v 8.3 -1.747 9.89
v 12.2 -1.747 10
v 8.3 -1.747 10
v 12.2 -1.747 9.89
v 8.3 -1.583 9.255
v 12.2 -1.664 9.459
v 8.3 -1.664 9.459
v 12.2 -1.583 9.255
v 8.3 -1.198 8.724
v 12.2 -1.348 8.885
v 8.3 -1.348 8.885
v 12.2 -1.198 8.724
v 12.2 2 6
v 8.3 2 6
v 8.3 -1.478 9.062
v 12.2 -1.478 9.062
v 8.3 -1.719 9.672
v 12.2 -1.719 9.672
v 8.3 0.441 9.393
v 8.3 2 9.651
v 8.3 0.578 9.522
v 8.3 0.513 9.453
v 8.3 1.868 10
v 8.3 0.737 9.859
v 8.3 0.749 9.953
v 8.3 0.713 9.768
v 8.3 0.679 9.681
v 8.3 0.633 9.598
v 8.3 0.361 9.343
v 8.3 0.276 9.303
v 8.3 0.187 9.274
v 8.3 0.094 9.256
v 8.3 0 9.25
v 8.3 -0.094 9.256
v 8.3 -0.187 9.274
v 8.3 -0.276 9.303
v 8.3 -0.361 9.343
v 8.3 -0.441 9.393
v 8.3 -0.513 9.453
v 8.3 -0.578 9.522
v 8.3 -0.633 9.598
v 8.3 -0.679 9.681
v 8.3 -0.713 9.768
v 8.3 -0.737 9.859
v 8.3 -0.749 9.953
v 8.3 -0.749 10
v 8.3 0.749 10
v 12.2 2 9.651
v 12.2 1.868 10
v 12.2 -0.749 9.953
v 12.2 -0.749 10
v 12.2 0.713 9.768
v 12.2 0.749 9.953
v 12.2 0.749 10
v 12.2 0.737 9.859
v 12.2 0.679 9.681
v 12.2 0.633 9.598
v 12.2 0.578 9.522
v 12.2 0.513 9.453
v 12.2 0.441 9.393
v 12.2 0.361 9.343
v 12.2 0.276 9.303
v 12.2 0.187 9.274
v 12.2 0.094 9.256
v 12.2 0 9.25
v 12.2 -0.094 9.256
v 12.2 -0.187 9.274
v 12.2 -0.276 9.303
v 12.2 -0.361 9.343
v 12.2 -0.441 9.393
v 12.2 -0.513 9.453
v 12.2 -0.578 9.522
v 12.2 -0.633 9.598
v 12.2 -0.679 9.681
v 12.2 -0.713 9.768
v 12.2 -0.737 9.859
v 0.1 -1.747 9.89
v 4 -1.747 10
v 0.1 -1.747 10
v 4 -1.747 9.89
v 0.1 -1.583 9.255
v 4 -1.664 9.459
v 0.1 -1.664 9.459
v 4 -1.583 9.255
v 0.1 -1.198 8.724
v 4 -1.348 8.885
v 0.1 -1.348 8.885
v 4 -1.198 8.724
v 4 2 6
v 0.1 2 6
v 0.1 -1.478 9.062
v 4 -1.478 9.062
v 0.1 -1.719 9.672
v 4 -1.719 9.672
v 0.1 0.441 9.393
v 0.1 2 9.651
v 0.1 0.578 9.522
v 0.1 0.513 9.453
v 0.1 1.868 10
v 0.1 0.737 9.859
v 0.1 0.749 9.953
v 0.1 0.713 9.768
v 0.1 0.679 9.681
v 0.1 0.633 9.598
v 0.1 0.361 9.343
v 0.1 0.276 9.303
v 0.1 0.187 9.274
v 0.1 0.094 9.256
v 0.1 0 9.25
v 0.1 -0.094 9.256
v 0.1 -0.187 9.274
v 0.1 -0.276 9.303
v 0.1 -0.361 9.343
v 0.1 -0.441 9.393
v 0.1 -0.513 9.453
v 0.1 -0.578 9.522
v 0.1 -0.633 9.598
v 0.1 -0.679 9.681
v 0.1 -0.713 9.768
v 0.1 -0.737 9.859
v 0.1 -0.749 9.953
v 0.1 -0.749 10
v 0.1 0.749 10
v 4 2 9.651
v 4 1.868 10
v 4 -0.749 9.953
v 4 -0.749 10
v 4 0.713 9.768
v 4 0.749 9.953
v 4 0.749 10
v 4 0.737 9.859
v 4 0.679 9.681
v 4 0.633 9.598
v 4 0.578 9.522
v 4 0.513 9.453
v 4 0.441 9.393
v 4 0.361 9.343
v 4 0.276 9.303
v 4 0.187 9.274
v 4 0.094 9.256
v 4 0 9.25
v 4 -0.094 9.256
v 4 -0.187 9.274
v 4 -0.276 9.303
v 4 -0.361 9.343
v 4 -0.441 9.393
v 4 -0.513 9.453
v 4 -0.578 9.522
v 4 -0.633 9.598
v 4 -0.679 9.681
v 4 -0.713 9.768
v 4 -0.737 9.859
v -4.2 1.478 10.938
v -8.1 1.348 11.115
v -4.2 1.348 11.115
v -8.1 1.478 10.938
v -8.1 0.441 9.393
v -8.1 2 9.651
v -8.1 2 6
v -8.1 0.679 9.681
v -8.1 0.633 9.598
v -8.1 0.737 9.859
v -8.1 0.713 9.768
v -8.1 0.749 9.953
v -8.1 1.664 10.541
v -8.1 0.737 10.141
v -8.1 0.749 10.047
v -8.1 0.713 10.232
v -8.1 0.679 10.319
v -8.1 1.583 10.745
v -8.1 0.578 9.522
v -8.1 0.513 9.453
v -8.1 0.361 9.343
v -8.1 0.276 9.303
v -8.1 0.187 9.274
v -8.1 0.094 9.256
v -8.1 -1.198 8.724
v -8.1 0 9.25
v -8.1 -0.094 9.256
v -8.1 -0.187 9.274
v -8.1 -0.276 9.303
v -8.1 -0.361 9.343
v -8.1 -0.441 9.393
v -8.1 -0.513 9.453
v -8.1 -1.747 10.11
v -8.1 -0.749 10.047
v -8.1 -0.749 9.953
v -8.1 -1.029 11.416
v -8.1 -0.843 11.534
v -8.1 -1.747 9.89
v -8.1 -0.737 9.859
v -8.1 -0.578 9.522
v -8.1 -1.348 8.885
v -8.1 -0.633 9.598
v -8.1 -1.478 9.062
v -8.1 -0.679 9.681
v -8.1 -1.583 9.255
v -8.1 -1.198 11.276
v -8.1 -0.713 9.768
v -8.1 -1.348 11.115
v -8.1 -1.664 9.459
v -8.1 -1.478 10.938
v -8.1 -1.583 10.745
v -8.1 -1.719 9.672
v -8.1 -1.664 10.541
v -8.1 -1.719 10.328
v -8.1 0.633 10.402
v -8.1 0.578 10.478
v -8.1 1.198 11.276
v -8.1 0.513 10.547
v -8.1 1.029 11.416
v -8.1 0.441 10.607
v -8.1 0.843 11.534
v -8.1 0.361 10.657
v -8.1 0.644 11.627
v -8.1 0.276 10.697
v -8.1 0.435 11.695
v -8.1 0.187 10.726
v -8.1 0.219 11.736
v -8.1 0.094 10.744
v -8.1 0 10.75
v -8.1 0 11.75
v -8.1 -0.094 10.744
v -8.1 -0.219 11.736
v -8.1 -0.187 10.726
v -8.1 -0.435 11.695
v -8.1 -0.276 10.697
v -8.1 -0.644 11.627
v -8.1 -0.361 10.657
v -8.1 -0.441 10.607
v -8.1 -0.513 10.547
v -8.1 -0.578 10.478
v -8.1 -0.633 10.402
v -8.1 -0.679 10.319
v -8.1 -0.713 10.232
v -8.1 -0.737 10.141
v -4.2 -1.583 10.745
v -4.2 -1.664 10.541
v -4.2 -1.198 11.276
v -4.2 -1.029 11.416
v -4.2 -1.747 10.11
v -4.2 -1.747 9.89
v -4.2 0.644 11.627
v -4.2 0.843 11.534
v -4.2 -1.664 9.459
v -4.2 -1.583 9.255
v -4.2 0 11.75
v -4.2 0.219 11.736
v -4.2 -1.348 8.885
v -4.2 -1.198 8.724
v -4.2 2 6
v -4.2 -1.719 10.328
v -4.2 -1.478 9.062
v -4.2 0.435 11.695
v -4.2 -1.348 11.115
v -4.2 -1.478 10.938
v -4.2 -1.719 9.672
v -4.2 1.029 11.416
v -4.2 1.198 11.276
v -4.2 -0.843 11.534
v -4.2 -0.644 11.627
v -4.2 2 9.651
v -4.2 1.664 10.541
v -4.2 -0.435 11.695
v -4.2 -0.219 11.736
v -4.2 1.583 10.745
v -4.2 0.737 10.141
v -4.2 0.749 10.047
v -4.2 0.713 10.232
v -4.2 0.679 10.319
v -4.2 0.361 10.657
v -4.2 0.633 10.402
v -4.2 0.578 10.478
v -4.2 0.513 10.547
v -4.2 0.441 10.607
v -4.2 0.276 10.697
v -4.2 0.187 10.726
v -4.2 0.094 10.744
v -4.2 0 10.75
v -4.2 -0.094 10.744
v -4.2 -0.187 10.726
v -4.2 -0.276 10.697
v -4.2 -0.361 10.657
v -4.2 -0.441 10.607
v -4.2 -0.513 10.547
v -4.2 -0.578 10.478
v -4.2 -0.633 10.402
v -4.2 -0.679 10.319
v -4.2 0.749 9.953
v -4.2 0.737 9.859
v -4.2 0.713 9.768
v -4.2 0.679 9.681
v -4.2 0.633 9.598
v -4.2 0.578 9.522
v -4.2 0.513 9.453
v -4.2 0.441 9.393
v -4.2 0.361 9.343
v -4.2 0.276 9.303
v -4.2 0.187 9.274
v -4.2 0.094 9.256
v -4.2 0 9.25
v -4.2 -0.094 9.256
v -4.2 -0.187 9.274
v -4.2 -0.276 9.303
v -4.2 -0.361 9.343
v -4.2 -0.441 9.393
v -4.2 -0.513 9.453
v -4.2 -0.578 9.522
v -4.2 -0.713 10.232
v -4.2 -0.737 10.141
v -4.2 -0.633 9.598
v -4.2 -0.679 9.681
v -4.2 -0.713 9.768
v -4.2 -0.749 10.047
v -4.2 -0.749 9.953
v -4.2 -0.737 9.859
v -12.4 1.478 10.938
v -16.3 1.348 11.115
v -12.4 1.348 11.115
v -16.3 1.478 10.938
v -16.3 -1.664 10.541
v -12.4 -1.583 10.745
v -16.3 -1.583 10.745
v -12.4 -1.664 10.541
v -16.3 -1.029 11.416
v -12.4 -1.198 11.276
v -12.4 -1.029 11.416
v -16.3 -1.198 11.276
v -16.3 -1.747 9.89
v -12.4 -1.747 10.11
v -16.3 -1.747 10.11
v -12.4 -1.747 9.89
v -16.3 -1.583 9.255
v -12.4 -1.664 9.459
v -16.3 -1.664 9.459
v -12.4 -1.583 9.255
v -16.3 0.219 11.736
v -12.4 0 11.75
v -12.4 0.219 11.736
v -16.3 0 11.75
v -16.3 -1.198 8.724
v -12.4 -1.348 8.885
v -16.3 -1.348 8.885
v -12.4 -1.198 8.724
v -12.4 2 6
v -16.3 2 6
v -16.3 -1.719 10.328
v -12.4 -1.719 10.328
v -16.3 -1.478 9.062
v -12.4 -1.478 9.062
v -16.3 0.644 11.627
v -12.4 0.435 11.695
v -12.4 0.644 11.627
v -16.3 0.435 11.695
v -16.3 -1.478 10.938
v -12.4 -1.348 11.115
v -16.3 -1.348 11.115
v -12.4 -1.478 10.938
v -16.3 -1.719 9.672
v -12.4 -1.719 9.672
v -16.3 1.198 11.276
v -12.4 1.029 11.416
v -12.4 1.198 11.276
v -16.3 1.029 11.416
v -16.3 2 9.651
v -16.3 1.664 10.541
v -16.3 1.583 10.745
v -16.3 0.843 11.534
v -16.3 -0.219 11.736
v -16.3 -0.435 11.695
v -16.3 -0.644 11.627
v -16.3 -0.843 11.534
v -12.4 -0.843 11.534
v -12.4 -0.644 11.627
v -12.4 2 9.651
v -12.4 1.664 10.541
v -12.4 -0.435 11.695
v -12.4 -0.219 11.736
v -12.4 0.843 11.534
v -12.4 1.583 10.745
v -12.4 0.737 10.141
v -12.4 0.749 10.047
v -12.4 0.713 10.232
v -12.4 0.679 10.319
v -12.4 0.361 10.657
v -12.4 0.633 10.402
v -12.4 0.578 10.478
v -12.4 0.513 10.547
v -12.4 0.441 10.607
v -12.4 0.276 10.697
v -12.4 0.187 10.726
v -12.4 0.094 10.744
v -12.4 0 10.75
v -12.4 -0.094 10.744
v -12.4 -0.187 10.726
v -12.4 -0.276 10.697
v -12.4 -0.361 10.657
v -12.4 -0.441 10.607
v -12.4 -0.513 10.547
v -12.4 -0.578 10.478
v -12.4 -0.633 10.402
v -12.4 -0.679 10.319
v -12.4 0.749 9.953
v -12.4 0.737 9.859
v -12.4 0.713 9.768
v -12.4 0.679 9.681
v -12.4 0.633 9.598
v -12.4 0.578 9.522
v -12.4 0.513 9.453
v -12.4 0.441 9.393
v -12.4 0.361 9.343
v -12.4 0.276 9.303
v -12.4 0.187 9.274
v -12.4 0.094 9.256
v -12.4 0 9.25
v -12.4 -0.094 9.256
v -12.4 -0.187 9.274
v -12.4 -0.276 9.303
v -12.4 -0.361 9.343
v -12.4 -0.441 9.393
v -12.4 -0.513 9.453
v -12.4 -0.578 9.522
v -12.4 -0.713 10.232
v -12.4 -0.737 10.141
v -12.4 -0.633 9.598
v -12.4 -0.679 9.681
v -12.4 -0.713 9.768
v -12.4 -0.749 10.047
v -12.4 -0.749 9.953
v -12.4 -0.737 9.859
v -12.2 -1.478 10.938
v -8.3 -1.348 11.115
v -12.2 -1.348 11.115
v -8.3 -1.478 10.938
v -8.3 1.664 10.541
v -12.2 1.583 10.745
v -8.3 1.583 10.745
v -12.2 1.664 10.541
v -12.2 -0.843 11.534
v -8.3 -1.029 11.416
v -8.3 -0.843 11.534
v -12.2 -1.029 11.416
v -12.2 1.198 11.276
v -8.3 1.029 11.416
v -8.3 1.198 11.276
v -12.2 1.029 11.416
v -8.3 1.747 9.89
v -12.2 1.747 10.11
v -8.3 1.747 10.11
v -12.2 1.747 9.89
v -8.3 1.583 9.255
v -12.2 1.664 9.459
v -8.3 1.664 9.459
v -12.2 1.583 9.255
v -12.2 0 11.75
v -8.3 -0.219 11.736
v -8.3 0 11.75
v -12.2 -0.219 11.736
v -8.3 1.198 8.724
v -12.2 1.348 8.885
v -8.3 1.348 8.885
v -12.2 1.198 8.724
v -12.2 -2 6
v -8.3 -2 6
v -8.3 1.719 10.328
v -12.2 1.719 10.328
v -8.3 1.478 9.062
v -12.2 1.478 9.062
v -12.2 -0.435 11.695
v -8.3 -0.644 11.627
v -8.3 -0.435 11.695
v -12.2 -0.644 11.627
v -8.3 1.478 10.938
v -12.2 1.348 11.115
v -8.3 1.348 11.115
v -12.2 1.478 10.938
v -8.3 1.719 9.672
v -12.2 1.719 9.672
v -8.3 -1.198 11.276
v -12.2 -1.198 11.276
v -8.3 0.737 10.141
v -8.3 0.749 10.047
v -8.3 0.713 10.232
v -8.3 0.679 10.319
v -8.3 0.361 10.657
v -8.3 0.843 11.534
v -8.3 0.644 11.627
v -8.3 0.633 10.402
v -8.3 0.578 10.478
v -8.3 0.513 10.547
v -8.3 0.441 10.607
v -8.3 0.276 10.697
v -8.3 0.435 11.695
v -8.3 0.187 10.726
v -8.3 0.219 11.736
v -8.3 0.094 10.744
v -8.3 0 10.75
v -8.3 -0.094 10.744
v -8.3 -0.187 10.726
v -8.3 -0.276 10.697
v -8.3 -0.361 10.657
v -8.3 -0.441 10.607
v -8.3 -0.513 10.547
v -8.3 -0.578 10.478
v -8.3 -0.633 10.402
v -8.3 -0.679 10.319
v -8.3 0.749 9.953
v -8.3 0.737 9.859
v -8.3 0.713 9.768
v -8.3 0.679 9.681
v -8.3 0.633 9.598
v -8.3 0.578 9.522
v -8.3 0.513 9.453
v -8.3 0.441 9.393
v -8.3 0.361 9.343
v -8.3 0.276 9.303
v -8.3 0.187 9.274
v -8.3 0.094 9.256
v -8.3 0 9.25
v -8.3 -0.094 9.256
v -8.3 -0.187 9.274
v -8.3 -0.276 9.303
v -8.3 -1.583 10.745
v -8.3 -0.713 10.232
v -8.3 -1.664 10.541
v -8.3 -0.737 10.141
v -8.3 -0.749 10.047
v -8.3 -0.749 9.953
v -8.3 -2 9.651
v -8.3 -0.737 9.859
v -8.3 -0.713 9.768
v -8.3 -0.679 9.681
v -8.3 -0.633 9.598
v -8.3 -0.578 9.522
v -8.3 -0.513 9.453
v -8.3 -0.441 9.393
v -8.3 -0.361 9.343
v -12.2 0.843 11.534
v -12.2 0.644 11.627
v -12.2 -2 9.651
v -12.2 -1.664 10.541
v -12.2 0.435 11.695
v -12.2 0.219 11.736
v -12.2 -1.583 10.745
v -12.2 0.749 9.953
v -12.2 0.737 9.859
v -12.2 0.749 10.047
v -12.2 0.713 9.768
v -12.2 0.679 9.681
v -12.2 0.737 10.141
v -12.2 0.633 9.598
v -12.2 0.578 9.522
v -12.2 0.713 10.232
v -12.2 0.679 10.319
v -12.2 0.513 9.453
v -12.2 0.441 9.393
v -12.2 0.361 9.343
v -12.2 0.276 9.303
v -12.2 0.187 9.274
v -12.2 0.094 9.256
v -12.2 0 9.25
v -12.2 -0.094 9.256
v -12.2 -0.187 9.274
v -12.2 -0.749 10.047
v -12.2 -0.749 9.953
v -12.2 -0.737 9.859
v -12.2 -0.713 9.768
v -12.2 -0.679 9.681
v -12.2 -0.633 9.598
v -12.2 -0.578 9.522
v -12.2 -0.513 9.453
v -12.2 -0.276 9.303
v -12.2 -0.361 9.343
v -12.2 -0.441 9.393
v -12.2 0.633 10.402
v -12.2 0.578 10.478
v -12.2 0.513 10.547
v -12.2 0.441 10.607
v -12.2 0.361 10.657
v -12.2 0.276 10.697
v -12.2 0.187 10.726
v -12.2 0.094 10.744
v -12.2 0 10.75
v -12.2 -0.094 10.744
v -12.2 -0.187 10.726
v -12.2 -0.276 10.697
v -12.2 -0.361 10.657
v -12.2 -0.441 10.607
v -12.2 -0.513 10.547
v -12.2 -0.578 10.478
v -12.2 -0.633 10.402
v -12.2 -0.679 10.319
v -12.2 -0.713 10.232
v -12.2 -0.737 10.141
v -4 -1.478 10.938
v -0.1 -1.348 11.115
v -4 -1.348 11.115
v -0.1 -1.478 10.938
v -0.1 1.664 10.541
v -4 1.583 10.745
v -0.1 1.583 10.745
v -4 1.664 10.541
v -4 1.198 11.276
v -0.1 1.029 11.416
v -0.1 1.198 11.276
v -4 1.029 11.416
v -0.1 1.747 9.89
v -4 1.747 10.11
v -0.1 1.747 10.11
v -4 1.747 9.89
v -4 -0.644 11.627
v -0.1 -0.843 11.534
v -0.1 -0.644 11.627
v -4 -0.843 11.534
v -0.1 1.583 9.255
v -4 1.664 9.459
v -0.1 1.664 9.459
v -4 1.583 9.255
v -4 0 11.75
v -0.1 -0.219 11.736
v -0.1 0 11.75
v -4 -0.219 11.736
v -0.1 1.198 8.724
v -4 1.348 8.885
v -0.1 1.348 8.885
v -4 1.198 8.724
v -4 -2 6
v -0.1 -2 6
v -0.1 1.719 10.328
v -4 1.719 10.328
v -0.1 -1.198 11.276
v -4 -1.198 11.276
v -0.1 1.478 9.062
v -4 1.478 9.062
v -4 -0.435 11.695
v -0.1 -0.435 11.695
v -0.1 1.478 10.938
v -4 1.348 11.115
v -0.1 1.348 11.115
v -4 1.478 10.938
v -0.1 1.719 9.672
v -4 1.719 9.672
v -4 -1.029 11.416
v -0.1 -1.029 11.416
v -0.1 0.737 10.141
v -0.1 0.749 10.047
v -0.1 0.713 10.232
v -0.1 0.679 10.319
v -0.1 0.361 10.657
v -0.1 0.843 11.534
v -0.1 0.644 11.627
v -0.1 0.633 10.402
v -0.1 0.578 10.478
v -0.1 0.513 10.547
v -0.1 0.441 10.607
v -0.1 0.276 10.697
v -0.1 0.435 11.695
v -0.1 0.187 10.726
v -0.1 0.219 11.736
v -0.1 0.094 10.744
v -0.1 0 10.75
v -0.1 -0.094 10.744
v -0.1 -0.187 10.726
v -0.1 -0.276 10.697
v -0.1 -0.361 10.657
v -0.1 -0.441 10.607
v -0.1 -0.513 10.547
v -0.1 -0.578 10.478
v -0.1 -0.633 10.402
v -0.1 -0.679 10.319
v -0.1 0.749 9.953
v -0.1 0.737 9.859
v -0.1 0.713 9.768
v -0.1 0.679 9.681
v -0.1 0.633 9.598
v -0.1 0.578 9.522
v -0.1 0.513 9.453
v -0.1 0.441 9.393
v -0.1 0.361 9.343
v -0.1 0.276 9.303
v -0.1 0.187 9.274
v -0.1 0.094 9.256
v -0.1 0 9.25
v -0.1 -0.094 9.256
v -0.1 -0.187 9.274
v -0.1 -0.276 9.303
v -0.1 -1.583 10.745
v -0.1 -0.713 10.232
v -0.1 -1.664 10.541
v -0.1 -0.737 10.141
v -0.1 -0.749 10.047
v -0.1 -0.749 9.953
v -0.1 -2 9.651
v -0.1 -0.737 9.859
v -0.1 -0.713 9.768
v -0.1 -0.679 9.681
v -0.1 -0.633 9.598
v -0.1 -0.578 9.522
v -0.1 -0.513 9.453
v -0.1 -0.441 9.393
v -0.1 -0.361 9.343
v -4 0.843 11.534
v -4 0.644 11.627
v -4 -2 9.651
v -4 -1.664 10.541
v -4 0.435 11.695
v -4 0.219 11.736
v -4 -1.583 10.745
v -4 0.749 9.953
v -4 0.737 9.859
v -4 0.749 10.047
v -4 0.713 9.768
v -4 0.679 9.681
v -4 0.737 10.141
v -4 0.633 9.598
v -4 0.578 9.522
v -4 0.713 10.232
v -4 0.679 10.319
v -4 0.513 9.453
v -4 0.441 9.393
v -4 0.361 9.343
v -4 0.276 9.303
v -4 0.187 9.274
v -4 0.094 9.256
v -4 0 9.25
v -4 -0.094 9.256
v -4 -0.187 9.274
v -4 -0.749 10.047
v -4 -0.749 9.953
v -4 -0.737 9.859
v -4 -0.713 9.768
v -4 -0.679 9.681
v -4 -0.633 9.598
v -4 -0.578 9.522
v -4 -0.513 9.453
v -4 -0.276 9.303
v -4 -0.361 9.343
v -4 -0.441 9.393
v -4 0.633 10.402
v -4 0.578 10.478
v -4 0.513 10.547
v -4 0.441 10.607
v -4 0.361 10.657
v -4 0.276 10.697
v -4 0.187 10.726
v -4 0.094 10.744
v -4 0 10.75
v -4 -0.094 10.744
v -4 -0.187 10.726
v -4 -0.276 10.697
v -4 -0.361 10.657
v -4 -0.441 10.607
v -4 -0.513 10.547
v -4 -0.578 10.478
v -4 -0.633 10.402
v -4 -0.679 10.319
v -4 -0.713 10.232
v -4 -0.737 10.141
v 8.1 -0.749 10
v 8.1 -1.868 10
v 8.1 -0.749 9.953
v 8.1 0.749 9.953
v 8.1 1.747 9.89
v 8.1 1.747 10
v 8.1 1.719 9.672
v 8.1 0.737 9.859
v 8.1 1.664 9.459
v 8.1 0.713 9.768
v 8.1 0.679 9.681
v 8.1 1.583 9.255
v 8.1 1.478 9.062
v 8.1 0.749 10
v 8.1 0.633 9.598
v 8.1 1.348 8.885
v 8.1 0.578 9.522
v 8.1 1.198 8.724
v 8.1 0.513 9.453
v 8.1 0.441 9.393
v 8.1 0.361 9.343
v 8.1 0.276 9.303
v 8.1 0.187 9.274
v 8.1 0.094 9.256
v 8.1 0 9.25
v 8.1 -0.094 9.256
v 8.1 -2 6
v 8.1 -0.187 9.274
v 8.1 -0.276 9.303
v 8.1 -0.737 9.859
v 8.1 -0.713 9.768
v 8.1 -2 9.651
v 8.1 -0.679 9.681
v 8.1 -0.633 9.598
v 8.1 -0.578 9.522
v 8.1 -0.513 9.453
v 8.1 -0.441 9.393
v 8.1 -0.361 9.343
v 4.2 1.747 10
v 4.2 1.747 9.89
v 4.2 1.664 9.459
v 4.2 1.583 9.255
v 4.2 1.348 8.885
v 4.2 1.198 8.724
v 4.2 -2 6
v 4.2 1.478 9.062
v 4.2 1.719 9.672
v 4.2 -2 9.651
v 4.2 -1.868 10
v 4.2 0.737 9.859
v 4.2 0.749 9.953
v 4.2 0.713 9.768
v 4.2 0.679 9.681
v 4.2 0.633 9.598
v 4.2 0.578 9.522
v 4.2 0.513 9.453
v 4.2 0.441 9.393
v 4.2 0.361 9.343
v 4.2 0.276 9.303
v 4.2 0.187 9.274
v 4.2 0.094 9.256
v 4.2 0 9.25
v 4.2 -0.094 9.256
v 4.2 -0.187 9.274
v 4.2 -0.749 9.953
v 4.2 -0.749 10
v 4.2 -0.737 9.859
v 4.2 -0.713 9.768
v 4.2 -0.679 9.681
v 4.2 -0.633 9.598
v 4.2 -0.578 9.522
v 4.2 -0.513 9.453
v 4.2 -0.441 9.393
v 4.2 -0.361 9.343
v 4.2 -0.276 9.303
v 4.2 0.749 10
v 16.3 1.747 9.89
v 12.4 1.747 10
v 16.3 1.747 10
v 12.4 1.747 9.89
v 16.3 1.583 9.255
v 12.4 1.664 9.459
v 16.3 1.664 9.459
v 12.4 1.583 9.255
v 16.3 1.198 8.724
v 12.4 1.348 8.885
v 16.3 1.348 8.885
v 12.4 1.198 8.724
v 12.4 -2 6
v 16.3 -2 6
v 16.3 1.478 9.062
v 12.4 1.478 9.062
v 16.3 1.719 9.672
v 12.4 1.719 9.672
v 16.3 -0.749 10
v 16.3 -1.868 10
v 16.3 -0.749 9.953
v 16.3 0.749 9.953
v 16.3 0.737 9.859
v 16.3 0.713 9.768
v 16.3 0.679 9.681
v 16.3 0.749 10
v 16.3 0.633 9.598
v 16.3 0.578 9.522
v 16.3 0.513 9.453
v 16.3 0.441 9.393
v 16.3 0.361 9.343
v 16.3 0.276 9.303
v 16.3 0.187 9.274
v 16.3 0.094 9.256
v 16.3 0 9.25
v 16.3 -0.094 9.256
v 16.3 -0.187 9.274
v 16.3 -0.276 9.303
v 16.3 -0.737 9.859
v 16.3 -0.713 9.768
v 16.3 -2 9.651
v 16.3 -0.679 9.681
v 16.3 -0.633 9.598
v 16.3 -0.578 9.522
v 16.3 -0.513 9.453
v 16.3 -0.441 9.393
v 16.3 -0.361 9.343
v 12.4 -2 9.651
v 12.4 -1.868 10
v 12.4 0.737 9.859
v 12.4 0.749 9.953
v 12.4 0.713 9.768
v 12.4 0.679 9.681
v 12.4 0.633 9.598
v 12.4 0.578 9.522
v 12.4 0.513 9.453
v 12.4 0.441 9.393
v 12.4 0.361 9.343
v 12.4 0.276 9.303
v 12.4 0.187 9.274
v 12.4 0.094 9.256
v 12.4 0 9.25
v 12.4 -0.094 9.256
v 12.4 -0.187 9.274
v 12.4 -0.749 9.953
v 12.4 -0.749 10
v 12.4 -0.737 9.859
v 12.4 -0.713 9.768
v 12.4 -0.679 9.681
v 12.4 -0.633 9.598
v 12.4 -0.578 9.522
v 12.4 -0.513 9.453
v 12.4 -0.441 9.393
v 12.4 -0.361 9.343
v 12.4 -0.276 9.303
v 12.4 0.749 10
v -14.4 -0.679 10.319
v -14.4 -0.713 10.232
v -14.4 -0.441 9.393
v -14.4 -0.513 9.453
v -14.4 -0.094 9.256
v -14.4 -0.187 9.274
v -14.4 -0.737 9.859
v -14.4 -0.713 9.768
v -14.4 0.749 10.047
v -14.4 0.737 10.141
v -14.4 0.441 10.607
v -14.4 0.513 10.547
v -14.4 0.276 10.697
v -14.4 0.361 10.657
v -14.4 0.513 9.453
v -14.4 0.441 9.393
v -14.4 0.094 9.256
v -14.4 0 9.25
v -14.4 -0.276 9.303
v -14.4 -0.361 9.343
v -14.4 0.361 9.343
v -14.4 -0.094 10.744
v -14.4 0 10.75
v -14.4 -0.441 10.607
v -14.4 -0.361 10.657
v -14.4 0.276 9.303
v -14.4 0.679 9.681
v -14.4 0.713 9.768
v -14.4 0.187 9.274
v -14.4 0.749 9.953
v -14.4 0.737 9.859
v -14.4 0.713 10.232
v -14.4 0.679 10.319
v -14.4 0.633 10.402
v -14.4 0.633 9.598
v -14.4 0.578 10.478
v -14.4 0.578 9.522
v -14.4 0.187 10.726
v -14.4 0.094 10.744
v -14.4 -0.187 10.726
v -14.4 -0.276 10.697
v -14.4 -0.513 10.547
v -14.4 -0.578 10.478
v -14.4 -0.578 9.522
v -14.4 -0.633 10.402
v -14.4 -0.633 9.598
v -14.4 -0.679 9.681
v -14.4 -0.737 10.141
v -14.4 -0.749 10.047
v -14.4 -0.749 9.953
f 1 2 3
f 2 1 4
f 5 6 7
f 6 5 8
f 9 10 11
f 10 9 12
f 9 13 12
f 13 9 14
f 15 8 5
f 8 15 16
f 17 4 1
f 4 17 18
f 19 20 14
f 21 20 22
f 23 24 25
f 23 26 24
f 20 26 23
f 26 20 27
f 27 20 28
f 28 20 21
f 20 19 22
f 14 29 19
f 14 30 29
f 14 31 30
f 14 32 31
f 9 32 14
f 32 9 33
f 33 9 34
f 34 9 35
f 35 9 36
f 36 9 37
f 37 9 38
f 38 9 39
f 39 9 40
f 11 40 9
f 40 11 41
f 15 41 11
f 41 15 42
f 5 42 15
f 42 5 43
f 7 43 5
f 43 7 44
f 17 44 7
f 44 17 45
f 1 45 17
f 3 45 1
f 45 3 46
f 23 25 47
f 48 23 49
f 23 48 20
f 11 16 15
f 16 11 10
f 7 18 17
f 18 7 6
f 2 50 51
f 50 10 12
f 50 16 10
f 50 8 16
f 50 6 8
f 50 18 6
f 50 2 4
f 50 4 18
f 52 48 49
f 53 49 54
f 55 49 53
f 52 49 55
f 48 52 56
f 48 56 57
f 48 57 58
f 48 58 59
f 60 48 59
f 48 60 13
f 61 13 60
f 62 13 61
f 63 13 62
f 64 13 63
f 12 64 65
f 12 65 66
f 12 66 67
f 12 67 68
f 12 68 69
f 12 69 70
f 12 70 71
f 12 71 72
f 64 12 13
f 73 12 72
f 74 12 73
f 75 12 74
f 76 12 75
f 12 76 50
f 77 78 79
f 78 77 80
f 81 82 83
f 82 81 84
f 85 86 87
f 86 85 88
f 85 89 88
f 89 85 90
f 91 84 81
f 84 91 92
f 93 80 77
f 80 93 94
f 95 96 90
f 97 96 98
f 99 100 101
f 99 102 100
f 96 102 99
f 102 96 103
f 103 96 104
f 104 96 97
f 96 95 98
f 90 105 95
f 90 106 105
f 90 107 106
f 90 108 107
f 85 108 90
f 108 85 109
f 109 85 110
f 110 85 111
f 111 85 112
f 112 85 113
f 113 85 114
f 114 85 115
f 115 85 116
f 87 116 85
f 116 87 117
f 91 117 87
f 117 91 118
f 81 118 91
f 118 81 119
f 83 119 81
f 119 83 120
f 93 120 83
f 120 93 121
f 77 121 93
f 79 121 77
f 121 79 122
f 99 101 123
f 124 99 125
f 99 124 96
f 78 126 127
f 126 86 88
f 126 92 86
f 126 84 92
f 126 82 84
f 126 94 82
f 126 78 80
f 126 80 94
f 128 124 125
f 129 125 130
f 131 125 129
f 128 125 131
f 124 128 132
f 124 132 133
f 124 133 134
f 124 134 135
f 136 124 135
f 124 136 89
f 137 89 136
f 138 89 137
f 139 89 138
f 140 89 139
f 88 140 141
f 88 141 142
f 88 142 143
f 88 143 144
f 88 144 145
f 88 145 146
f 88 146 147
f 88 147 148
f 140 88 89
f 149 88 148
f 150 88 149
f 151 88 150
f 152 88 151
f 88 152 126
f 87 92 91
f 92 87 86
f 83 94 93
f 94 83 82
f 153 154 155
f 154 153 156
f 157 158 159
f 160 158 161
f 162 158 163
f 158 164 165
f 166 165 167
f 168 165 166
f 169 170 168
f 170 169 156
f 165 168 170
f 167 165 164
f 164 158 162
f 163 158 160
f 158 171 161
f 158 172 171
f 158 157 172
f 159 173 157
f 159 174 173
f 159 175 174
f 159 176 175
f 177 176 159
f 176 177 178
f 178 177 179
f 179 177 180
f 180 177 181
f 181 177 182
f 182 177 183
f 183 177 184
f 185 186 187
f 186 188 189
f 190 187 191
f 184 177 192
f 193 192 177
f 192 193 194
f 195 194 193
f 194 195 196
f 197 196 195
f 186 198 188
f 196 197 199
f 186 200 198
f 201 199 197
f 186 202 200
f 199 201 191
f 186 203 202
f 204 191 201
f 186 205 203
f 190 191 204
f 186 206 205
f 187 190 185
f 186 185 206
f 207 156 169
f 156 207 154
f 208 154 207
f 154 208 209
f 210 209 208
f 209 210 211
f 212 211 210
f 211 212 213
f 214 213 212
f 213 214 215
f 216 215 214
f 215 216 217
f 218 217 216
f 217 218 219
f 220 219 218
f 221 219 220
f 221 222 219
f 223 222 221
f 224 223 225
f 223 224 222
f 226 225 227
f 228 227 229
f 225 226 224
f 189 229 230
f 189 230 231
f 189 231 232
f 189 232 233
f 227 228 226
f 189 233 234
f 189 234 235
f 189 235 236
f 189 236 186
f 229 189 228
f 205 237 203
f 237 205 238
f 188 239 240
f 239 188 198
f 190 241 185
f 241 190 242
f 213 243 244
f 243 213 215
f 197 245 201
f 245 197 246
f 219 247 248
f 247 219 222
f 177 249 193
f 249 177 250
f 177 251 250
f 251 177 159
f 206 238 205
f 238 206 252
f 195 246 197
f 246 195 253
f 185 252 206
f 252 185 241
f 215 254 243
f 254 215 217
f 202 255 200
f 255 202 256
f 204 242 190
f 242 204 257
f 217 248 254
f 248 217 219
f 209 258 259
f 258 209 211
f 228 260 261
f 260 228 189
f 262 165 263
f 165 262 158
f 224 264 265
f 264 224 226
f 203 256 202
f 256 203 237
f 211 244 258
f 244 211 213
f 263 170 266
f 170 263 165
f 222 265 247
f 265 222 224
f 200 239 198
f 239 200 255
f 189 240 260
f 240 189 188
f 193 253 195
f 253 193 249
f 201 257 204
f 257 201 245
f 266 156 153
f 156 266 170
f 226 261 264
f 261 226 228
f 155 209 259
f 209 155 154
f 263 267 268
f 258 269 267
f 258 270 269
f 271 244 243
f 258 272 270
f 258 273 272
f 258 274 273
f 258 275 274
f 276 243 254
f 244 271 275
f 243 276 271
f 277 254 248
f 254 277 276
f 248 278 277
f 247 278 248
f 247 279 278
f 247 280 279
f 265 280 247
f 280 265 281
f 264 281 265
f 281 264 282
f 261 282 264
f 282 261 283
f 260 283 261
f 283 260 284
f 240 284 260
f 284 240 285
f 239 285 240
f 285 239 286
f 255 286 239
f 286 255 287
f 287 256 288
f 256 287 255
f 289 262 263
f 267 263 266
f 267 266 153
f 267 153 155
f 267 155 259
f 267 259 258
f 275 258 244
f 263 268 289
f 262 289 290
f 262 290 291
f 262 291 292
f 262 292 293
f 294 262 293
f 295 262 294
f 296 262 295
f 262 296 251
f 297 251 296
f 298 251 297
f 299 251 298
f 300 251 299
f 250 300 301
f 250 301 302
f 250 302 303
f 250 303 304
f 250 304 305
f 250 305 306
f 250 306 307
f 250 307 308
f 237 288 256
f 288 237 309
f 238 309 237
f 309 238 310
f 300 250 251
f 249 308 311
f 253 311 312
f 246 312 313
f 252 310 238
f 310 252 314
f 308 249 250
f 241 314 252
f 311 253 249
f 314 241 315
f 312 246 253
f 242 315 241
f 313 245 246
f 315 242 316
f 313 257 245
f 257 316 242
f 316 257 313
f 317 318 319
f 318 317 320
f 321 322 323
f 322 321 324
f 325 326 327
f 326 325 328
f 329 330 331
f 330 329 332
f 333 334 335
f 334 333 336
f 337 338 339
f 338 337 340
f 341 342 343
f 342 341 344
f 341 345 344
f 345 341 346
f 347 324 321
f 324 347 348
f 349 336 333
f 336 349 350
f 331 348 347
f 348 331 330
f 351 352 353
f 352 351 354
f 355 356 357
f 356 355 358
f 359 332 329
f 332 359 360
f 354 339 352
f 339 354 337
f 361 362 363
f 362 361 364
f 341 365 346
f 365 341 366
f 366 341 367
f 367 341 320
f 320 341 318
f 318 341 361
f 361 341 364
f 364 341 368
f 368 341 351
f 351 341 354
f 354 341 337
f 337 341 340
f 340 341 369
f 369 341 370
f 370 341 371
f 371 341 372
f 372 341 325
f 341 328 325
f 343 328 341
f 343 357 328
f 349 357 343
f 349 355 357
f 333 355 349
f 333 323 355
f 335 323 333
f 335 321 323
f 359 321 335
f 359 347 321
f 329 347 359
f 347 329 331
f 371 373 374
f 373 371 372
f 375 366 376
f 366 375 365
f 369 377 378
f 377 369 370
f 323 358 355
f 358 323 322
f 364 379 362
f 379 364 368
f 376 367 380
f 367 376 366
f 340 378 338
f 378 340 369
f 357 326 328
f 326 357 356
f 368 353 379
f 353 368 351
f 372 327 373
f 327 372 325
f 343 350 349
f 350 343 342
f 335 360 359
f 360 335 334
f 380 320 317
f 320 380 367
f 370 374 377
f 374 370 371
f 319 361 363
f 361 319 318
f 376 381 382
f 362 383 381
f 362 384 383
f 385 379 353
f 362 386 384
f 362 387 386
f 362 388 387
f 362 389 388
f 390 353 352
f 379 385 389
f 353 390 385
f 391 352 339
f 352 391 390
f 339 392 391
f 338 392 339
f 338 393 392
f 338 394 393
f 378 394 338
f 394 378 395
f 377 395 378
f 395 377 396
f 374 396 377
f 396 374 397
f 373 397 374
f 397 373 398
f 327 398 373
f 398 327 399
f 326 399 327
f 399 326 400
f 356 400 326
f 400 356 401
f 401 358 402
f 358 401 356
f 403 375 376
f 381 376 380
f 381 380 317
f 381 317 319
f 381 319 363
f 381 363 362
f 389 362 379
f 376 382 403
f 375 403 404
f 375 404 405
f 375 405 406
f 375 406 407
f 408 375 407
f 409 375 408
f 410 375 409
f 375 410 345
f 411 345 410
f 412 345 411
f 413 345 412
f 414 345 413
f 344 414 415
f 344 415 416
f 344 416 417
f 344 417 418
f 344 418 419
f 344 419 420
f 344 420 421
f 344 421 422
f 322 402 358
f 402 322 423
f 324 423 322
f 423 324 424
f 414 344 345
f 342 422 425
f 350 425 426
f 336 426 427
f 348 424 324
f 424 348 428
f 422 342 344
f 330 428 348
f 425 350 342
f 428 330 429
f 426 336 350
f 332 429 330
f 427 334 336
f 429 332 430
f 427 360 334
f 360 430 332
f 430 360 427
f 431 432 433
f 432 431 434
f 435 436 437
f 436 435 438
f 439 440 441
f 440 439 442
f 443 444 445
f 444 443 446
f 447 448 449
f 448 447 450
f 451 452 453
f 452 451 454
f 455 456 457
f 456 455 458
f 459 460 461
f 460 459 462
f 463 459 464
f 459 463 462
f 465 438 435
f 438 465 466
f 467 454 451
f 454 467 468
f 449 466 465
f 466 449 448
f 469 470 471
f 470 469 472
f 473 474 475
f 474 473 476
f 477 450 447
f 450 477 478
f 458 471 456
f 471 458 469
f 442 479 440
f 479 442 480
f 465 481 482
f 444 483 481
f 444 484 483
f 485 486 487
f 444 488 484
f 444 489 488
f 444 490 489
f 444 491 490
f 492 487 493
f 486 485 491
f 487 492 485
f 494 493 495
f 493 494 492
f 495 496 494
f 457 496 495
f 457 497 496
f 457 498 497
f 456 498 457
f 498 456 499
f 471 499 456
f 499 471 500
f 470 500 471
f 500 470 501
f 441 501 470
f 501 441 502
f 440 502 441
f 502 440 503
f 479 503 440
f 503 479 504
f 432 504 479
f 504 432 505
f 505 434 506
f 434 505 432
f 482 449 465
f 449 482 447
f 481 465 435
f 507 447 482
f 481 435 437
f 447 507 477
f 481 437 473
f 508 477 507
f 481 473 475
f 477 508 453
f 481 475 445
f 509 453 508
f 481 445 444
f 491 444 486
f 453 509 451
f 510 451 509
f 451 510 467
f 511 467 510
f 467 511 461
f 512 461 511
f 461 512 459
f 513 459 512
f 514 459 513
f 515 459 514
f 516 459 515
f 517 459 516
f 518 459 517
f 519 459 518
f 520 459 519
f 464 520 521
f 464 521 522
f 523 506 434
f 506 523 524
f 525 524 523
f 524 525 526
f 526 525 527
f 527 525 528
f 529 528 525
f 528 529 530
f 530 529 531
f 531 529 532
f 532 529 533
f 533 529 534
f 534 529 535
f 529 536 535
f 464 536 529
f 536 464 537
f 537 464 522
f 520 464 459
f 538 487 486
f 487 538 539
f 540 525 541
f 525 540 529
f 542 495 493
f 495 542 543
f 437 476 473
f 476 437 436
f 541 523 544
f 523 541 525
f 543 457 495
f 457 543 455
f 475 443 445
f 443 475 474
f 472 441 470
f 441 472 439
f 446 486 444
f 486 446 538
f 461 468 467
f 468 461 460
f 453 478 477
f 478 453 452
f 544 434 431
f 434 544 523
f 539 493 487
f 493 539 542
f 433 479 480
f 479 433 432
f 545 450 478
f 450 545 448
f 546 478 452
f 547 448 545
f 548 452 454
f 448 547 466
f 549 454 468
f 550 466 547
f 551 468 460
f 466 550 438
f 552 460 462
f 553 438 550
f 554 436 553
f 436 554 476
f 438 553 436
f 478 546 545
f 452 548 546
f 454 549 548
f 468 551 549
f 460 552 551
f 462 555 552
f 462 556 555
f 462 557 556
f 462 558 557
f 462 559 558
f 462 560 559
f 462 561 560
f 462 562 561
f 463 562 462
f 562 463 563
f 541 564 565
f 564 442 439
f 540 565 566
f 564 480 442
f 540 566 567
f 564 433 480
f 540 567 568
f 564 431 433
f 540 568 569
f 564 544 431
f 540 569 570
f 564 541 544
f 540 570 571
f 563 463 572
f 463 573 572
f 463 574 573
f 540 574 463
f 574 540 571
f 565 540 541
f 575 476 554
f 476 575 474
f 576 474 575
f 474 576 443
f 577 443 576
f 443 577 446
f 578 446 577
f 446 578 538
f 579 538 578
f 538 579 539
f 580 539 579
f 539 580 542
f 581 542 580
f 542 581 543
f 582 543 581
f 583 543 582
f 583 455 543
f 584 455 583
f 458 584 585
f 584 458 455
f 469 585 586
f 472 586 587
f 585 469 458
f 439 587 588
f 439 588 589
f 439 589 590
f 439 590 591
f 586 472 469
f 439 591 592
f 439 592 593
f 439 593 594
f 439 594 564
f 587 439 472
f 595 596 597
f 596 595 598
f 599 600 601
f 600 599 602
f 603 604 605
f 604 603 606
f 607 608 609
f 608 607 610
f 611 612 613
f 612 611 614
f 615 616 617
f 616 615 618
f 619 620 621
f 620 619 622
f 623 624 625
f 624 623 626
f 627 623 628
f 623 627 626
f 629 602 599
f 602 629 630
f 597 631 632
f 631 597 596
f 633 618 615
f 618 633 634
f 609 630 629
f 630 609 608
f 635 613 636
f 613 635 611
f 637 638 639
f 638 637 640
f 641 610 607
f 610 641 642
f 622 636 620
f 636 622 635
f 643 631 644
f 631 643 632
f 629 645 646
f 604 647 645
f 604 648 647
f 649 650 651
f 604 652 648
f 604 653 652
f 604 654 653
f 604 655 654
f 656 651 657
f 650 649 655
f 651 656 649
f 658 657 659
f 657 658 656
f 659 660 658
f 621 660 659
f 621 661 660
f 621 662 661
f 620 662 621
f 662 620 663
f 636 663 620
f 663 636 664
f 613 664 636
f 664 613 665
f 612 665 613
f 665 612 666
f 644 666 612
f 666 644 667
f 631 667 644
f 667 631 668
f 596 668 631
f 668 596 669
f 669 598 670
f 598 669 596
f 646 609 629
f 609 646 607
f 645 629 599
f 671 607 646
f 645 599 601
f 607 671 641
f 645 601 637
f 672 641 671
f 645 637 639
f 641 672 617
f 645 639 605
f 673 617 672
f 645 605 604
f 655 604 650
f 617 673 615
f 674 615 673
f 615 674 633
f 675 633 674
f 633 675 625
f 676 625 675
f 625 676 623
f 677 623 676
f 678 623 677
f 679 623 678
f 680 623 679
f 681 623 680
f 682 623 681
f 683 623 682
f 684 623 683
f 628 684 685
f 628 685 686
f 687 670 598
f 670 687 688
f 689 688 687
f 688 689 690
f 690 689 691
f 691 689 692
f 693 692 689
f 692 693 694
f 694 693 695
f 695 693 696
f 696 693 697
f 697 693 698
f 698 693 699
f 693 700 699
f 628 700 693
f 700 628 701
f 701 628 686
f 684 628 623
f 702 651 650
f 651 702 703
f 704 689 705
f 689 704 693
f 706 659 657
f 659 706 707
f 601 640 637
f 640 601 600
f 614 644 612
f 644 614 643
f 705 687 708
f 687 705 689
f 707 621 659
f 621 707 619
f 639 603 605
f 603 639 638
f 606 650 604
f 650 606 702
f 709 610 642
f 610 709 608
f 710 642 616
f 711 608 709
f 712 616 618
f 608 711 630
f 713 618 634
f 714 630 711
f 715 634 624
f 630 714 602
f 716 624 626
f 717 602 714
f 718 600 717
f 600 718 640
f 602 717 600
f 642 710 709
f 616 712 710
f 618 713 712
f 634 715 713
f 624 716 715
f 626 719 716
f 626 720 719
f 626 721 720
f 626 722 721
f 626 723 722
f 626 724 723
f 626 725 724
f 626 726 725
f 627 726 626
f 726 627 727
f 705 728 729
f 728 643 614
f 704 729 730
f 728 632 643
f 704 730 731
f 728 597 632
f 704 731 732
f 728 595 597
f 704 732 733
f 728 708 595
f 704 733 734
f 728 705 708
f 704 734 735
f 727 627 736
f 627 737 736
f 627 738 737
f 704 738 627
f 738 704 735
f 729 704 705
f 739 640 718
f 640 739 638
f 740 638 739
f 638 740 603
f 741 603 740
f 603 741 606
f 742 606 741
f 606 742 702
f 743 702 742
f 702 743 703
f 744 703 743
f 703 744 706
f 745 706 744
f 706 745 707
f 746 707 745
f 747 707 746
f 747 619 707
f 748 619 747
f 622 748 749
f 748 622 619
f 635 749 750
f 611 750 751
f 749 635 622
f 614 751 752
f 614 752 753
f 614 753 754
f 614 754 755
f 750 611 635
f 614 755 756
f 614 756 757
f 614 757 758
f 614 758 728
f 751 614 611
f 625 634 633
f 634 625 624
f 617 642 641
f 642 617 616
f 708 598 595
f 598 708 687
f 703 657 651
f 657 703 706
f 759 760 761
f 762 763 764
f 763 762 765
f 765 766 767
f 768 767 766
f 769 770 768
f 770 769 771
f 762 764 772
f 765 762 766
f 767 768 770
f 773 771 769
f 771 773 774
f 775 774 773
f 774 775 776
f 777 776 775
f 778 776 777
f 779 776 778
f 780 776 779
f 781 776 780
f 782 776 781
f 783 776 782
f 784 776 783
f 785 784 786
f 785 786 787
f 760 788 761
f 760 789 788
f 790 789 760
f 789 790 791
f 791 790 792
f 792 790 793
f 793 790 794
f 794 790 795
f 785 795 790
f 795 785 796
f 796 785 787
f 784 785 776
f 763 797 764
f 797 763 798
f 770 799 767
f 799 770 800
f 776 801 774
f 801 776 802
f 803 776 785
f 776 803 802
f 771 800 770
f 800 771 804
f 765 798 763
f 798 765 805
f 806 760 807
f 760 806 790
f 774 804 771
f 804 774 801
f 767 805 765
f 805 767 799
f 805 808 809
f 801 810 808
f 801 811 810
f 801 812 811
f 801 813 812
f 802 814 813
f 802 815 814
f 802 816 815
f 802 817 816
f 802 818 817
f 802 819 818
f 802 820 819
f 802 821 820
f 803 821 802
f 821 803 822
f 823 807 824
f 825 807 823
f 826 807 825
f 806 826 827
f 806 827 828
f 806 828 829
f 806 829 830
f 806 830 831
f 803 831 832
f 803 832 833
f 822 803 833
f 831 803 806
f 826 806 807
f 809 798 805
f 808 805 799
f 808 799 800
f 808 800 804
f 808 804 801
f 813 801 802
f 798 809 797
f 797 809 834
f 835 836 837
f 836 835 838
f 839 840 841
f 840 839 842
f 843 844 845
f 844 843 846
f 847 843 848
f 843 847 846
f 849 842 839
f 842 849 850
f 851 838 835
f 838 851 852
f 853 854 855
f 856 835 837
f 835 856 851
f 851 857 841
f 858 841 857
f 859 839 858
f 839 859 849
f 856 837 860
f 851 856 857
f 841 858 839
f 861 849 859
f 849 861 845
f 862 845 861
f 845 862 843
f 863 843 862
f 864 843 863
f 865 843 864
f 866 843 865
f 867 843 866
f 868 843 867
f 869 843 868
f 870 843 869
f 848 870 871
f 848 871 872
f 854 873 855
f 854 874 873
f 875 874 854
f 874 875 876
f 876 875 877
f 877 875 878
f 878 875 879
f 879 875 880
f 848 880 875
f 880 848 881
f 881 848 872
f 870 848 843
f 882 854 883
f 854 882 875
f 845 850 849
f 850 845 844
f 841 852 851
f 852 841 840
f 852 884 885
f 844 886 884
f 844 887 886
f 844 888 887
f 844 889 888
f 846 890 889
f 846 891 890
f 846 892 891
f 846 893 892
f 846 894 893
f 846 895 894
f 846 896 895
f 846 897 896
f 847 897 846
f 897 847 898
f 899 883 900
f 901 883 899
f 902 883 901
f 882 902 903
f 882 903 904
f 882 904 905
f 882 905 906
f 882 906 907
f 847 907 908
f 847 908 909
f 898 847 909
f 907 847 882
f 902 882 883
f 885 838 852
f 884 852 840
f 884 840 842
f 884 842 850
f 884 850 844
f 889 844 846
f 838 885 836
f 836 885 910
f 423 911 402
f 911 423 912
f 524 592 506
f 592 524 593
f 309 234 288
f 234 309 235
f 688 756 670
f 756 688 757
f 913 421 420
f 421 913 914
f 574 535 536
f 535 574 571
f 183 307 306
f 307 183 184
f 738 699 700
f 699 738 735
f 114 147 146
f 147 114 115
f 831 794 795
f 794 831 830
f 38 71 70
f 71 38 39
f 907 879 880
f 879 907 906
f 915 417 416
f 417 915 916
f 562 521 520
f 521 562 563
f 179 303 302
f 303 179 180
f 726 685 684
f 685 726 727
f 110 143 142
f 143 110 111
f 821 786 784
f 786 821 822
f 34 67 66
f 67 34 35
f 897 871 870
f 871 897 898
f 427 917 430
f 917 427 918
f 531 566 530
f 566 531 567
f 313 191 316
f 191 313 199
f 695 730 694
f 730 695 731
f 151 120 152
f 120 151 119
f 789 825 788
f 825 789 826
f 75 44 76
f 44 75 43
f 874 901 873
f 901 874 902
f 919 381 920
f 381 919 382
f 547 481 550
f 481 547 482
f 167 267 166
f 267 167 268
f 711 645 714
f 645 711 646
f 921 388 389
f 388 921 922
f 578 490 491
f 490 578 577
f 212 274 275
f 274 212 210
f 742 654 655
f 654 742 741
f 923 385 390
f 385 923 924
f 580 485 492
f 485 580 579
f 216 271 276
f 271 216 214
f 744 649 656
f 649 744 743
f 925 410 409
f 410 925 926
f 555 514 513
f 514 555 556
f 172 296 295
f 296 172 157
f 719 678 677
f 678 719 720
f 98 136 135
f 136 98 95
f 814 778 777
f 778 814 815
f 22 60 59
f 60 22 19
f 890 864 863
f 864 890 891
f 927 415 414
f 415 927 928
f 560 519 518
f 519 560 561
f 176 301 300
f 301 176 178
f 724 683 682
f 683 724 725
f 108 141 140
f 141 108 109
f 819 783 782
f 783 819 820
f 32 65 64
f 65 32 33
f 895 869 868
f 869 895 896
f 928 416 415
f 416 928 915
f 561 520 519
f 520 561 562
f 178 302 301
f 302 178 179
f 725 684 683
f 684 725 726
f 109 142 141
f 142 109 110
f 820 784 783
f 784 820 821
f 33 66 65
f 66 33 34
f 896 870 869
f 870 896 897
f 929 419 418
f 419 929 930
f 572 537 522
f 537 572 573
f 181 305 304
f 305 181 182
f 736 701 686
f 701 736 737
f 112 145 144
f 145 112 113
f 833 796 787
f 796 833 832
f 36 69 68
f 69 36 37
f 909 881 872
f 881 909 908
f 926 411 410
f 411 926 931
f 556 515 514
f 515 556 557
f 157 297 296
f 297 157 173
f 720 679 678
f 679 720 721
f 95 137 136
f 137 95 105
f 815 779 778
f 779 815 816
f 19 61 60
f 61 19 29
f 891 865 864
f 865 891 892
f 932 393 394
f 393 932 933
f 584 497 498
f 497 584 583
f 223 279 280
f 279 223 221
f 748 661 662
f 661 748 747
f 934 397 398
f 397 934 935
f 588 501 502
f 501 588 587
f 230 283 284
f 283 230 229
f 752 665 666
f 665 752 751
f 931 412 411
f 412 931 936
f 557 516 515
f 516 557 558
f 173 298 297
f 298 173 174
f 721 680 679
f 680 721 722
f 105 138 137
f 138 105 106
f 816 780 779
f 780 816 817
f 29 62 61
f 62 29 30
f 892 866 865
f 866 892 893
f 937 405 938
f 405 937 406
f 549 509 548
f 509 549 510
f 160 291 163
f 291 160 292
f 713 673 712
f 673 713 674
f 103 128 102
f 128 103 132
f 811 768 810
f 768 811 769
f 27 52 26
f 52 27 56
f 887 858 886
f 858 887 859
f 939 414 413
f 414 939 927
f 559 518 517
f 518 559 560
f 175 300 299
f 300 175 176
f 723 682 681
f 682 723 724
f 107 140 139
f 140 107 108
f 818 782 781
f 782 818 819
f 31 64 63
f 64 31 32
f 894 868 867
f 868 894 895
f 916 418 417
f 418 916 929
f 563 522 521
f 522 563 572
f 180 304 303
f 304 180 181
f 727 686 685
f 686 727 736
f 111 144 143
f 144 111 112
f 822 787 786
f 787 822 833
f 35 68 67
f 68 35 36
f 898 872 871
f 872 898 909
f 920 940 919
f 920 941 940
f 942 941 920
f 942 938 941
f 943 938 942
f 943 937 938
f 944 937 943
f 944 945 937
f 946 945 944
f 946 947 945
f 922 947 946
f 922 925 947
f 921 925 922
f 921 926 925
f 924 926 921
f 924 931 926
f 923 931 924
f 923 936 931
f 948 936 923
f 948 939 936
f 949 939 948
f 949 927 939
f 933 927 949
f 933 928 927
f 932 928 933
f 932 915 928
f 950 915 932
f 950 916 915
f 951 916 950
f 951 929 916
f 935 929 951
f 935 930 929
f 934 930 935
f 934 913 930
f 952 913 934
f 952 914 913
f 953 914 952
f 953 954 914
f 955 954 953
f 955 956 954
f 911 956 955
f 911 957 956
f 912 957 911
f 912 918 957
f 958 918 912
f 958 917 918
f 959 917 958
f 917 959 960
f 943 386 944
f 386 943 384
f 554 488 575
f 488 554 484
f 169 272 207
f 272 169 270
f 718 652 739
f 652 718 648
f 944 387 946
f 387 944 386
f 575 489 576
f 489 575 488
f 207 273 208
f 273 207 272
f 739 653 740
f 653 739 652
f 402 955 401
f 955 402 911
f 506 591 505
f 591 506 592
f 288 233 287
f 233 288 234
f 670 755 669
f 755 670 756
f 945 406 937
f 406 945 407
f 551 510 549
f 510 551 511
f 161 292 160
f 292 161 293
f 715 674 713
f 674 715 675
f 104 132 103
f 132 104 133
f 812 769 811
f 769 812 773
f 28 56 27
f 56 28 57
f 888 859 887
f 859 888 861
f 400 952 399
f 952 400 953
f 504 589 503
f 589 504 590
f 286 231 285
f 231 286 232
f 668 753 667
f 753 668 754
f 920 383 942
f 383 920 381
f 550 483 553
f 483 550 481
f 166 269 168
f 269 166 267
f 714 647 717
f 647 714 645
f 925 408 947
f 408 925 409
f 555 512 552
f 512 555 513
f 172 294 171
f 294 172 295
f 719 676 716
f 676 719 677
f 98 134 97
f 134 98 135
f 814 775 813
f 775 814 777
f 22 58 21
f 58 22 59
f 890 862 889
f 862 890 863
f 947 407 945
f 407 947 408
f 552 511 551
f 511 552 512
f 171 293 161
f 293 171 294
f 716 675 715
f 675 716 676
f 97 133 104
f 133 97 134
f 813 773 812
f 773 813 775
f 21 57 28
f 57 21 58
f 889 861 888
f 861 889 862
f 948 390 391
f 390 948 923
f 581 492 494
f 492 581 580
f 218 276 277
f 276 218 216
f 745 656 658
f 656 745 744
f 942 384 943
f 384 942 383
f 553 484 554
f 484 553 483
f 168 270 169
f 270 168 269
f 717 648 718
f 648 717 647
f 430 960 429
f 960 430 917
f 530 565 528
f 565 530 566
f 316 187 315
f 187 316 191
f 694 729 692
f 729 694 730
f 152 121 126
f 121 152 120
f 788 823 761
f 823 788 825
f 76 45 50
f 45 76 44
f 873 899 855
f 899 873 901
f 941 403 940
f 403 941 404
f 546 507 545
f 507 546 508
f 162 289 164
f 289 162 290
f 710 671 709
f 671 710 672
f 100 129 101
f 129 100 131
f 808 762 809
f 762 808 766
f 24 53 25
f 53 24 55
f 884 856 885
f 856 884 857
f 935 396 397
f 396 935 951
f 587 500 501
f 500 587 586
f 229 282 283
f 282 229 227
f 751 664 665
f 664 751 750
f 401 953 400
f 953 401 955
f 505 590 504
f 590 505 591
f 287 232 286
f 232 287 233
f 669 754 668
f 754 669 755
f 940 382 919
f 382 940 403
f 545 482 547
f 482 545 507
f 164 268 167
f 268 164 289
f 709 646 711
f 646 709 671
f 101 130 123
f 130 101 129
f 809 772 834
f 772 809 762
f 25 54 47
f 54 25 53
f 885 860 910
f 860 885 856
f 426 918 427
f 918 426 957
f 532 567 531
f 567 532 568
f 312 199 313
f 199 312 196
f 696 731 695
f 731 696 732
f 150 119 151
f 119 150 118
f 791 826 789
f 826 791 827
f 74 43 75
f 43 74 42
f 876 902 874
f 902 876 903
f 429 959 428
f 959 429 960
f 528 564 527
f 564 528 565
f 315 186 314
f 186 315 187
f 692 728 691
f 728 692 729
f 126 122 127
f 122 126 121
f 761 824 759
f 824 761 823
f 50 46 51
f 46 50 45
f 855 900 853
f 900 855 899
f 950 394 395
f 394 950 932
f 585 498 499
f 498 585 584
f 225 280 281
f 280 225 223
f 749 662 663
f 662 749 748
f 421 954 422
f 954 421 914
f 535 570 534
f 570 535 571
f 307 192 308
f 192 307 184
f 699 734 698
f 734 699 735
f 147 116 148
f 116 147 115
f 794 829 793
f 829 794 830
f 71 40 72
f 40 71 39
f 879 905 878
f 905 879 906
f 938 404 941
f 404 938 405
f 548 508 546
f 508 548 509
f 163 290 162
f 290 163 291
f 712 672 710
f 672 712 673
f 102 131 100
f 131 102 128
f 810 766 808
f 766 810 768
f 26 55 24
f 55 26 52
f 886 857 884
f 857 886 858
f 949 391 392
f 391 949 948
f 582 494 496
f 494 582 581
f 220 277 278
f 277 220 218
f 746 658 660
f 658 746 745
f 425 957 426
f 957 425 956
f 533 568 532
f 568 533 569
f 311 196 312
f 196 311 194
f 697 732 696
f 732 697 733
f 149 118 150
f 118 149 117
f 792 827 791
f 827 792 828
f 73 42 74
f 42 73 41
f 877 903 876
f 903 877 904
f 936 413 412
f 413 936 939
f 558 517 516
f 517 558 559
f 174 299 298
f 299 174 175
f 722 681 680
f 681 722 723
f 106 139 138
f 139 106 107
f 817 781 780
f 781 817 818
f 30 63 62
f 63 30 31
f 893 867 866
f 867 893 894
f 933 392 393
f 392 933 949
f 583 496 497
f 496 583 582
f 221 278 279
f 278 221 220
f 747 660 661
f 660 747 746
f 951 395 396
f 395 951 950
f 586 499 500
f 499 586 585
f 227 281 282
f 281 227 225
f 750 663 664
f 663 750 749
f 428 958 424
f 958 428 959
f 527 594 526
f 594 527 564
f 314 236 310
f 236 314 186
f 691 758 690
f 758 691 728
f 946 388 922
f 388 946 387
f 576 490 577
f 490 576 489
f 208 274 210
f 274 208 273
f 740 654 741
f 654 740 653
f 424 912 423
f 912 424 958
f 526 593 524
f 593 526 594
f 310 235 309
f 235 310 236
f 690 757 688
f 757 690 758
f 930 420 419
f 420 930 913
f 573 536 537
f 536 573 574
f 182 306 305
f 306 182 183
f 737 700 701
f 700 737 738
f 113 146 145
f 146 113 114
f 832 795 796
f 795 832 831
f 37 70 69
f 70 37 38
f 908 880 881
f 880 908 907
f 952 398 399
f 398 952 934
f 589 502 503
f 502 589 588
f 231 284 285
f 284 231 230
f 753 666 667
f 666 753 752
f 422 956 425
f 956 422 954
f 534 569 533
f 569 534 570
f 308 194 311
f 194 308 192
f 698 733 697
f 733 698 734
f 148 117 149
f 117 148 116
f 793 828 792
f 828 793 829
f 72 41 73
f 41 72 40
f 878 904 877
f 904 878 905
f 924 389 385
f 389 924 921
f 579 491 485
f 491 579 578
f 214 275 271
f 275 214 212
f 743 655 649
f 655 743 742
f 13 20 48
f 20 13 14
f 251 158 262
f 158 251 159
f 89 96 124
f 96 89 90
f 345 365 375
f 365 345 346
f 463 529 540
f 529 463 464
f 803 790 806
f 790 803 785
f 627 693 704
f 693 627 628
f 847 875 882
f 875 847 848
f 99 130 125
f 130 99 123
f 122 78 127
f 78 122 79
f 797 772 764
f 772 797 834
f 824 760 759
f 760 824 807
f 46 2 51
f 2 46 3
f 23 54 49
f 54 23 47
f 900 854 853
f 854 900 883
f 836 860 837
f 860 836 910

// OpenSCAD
// file: hinges.scad
/*
  author: Christopher O'Brien <obriencj@gmail.com>
  license: GPL v3
*/


module hinge_join(width, height, standoff, count, pin=0.5,
		  gap=0.1, pin_gap=0.25, $fn=50) {

     // this is the bore of the hinge barrels, based on the pin size
     // plus a tiny bit extra
     bore_r = pin + pin_gap;

     overall = (width + gap) * count * 2;

     intersection() {
	  translate([overall / -2, -standoff, 0]) {
	       cube([overall, standoff * 2, height * 2]);
	  }

	  union() {
	       // half the hinges are normal, and include their pins
	       children();

	       // the other half of the hinges have a hole removed that
	       // is meant to accept the pin
	       rotate([0, 0, 180]) {
		    difference() {
			 children();
			 translate([(overall / -2) + (width / 2), 0,
				     height - 0]) {
			      rotate([0, 90, 0]) {
				   cylinder(overall - width, bore_r, bore_r);
			      };
			 };
		    };
	       };
	  };
     };
}


module hinge_half(width, height, standoff, count=2, pin=0.5,
		  gap=0.1, $fn=50) {

     gwid = width - gap;

     locate = -(width + gap) * 2;

     barrel_r = standoff - 0.25;

     start = ceil(count / -2) + 1;
     stop = floor(count / 2);

     for(c = [start:stop]) {
	  translate([locate * c, 0, 0]) {
	       union() {
		    // is is the body of the barrel and a slanted
		    // segment that joins to the opposing parts
		    hull() {
			 translate([gap, 0, height]) {
			      rotate([0, 90, 0]) {
				   cylinder(gwid, barrel_r, barrel_r);
			      };
			 };
			 translate([gap, standoff, height - 4]) {
			      cube([gwid, 1, 1]);
			 };
		    };

		    if(pin) {
			 // this is the connecting pin, driven through the
			 // whole hing, and subtracted later from half of
			 // the hinges during hinge_join
			 translate([-1, 0, height]) {
			      rotate([0, 90, 0]) {
				   cylinder(width + 2, pin, pin);
			      };
			 };
		    };
	       };
	  };
     };
}


module hinges(barrel_width=4, center_height=8,
	      standoff=2, count=4, pin_r=0.5) {

     hinge_join(barrel_width, center_height, standoff, count, pin_r) {
	  hinge_half(barrel_width, center_height, standoff, count, pin_r);
     };
}


difference() {
     hinges(4, 10, 2, 4);

     // a little cut-away for debugging
     translate([0, -3, 10]) {
	  cube([17, 6, 2]);
     };
};


// The end.
// main file
use <hinges.scad>;


module unpinned_join(width, height, standoff, count, pin=0.5,
		     gap=0.1, pin_gap=0.25, $fn=50) {

     // this is the bore of the hinge barrels, based on the pin size
     // plus a tiny bit extra
     bore_r = pin + pin_gap;

     overall = (width + gap) * count * 2;

     intersection() {
	  translate([overall / -2, -standoff, 0]) {
	       cube([overall, standoff * 2, height * 2]);
	  }

	  difference() {
	       union() {
		    children();
		    rotate([0, 0, 180]) {
			 children();
		    };
	       };

	       translate([(overall / -2) + (width / 2), 0,
			  height - 0]) {
		    rotate([0, 90, 0]) {
			 cylinder(overall, bore_r, bore_r);
		    };
	       };
	  };
     };
}


module unpinned_hinges(barrel_width=4, center_height=8,
		       standoff=2, count=5, pin_r=0.5) {

     unpinned_join(barrel_width, center_height, standoff, count, pin_r) {
	  hinge_half(barrel_width, center_height, standoff,
		     count, pin=0);
     };

};


difference() {
     unpinned_hinges(4, 10, 2, 4);

     // a little cut-away for debugging
     translate([0, -3, 10]) {
	  cube([17, 6, 2]);
     };
};


// The end.
